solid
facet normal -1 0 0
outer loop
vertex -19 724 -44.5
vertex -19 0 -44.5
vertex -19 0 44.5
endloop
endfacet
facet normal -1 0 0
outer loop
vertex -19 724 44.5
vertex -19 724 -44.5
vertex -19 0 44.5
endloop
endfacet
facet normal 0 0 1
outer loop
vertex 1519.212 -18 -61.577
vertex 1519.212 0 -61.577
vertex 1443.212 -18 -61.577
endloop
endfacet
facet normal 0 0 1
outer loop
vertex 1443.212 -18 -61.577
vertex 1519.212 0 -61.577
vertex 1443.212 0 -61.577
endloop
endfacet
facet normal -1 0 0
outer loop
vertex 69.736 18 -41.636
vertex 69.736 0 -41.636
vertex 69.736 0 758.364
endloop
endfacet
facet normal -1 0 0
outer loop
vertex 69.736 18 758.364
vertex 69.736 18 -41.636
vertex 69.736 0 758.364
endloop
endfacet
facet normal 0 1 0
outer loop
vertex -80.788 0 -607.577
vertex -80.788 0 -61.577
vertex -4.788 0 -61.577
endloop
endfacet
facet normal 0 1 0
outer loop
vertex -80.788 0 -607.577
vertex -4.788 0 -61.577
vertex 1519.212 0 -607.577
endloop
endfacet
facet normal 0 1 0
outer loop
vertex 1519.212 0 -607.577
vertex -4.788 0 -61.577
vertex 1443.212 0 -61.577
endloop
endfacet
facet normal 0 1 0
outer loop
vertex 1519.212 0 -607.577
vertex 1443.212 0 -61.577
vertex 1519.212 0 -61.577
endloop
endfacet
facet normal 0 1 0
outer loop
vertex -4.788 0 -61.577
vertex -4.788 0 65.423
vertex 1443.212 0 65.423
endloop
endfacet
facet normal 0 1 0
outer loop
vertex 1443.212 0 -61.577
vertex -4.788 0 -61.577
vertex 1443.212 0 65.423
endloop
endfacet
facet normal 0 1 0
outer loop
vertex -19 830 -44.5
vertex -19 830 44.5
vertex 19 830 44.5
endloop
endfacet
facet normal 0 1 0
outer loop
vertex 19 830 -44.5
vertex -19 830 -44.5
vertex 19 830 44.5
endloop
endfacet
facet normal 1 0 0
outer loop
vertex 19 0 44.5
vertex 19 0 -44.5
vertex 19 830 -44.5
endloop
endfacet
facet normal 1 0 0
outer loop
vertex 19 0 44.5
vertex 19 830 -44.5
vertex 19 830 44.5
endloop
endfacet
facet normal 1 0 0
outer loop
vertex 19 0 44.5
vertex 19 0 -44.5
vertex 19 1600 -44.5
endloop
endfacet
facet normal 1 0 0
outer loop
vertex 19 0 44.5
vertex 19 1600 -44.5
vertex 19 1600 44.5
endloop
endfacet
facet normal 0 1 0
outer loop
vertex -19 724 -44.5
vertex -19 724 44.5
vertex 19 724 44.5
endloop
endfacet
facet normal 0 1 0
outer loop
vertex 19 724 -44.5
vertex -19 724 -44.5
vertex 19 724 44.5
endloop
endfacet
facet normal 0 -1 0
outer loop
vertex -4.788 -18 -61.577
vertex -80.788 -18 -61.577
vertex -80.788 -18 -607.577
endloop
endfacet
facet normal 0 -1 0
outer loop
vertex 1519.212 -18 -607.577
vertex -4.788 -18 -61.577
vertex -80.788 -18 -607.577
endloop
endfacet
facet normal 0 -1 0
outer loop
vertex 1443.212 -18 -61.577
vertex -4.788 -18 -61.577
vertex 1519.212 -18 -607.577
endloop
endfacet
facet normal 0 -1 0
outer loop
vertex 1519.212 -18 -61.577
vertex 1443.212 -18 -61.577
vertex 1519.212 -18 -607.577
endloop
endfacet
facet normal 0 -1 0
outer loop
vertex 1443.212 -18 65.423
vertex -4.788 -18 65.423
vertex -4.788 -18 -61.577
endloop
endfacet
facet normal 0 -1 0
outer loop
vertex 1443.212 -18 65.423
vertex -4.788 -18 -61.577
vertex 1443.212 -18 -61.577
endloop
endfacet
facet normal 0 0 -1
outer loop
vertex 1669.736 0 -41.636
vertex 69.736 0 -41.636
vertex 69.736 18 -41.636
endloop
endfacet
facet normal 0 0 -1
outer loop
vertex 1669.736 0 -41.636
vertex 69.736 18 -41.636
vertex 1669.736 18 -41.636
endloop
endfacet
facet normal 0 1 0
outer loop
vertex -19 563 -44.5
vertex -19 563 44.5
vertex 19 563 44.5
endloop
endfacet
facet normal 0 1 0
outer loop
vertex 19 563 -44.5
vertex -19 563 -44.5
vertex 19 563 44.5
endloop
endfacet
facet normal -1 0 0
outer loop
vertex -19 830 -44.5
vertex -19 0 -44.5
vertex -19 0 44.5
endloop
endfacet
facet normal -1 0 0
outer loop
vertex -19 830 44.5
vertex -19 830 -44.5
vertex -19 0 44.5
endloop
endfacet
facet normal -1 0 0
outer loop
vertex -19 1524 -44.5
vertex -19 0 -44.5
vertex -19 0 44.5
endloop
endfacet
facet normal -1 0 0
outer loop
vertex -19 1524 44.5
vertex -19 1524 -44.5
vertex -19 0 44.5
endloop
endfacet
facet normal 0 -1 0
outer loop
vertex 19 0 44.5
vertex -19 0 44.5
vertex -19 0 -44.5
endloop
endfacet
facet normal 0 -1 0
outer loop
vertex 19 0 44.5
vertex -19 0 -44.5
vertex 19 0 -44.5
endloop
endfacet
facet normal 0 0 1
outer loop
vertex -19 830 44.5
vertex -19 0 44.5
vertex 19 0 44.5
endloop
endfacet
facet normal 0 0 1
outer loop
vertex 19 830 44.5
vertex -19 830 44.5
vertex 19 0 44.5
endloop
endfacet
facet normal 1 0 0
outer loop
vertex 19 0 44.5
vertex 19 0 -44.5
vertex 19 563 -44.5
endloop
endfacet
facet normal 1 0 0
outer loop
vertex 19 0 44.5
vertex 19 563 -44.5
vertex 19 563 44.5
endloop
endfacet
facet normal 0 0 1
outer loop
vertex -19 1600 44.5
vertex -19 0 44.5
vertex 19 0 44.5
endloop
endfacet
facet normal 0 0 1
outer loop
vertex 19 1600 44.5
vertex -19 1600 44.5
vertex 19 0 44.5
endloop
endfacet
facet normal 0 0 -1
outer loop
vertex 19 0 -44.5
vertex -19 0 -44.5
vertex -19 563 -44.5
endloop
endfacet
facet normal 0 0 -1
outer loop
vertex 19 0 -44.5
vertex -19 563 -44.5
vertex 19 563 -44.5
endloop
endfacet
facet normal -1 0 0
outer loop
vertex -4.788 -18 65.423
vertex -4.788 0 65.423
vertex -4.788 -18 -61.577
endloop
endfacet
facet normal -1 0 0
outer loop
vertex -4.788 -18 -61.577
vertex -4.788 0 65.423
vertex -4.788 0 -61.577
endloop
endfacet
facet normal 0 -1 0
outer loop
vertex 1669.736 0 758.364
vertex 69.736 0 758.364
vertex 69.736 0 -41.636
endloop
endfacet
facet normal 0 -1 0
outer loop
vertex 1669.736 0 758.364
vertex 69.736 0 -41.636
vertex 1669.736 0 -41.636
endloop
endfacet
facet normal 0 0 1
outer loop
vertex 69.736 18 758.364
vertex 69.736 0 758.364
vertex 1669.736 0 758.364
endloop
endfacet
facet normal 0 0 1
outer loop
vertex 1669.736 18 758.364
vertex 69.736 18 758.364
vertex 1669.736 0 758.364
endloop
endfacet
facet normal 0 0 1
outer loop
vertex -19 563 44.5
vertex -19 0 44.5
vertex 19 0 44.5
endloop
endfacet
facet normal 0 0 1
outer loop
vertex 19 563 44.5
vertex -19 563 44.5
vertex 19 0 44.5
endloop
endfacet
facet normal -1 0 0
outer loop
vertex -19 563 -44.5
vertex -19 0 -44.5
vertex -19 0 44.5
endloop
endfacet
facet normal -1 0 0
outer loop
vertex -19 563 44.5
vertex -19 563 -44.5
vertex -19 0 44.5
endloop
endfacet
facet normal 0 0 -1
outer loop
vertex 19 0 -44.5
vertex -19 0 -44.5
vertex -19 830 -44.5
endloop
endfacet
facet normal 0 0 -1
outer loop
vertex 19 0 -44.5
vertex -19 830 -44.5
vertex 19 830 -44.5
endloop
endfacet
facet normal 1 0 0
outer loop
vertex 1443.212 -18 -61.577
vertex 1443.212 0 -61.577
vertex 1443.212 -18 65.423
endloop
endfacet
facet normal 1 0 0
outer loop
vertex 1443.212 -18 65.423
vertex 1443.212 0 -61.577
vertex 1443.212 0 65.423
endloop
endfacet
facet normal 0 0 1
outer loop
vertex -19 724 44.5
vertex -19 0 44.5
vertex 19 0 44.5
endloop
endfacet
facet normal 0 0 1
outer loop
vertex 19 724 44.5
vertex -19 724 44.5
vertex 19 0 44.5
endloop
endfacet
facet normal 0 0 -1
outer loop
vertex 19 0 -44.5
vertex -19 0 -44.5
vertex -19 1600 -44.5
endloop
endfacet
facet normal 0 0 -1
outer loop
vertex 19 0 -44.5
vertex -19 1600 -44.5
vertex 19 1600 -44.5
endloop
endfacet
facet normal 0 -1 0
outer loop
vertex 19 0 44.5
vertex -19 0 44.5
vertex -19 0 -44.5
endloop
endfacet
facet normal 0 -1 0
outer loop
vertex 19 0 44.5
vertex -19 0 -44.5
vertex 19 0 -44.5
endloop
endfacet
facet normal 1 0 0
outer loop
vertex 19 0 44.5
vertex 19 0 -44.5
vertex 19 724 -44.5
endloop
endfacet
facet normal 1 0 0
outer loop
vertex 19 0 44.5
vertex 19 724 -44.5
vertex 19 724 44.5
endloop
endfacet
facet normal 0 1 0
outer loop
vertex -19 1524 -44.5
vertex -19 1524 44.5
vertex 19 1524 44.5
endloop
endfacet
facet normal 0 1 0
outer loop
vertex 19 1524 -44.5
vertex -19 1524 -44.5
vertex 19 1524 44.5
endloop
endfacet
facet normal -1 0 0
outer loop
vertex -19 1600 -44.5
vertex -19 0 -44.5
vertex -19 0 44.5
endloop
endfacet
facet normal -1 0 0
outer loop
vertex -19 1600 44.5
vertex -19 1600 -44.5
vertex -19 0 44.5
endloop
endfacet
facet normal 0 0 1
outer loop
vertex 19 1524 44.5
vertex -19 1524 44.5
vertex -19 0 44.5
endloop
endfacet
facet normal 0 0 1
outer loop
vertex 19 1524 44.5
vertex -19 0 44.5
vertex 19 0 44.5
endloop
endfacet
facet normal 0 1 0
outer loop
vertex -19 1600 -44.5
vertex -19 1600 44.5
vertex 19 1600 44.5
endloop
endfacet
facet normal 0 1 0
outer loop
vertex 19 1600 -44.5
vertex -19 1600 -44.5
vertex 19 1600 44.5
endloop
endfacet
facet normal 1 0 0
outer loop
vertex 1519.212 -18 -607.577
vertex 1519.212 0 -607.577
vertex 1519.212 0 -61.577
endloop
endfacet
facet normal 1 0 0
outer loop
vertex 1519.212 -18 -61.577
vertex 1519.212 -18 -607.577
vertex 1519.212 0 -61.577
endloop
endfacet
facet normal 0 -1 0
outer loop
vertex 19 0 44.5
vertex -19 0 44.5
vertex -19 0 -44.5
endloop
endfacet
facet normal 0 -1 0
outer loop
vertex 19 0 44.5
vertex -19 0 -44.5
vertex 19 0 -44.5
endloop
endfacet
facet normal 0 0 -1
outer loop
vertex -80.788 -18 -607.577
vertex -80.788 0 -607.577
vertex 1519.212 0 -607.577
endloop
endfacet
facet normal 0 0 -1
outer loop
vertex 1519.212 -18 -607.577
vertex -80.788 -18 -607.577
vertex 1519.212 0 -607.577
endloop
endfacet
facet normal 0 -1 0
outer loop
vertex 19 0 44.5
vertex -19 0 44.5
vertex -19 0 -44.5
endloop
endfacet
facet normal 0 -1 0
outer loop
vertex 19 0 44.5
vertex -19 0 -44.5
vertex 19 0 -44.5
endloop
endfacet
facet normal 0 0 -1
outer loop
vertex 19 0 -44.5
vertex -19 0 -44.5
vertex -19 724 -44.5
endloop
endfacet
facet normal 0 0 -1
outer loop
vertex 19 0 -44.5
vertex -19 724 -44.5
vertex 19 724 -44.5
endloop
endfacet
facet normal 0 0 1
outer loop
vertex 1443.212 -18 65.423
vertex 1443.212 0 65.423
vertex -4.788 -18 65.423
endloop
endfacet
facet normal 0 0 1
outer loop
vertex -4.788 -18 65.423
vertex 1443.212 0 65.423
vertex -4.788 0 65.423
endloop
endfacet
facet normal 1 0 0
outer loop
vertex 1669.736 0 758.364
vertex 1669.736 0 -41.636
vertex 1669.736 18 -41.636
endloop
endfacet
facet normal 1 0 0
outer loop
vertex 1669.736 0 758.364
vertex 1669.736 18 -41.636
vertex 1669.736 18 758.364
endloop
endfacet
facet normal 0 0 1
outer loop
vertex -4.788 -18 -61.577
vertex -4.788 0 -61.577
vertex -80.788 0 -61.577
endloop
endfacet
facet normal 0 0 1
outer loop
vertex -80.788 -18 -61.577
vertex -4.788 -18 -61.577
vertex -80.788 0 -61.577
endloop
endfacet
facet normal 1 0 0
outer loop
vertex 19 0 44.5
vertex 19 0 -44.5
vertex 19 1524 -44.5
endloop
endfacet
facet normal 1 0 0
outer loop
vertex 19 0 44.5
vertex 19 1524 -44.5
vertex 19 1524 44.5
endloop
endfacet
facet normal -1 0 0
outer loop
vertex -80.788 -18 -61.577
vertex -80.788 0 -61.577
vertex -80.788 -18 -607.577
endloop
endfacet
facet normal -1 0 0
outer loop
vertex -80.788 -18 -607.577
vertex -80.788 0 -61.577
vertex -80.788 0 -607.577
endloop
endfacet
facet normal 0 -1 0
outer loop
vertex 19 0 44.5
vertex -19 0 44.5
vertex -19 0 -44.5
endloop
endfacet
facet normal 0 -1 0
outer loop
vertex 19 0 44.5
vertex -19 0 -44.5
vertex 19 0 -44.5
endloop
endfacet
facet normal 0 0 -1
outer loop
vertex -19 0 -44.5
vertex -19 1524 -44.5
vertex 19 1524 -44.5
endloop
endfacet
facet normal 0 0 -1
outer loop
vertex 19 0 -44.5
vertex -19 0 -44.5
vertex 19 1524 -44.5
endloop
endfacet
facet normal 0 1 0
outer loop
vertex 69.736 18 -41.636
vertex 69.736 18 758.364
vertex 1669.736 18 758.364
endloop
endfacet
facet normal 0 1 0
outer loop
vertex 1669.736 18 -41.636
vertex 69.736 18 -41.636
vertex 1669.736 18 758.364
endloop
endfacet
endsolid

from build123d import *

# Parameters (mm, degrees)
F5_W      = 38
F5_H      = 89
F6_DEPTH  = 1600
F7_DEPTH  = 724
F8_DEPTH  = 830
F9_DEPTH  = 563
F10_W     = 1600
F10_H     = 800
F11_DEPTH = 18
F12_DEPTH = 1524
F14_DEPTH = 18


with BuildPart() as f6:
    # F5 (on Front) → F6 (new body)
    with BuildSketch(Plane.XZ):
        Rectangle(F5_W, F5_H)
    extrude(amount=-F6_DEPTH)


with BuildPart() as f7:
    # F5 (on Front) → F7 (new body)
    with BuildSketch(Plane.XZ):
        Rectangle(F5_W, F5_H)
    extrude(amount=-F7_DEPTH)


with BuildPart() as f8:
    # F5 (on Front) → F8 (new body)
    with BuildSketch(Plane.XZ):
        Rectangle(F5_W, F5_H)
    extrude(amount=-F8_DEPTH)


with BuildPart() as f9:
    # F5 (on Front) → F9 (new body)
    with BuildSketch(Plane.XZ):
        Rectangle(F5_W, F5_H)
    extrude(amount=-F9_DEPTH)


with BuildPart() as f11:
    # F10 (on Front) → F11 (new body)
    with BuildSketch(Plane.XZ):
        with Locations((869.7355747223, 358.3636045456)):
            Rectangle(F10_W, F10_H)
    extrude(amount=-F11_DEPTH)


with BuildPart() as f12:
    # F5 (on Front) → F12 (new body)
    with BuildSketch(Plane.XZ):
        Rectangle(F5_W, F5_H)
    extrude(amount=-F12_DEPTH)


with BuildPart() as f14:
    # F13 (on Front) → F14 (new body)
    with BuildSketch(Plane.XZ):
        Polygon((1443.2116563372, 65.4233279824), (-4.7883436628, 65.4233279824), (-4.7883436628, -61.5766720176), (-80.7883436628, -61.5766720176), (-80.7883436628, -607.5766720176), (1519.2116563372, -607.5766720176), (1519.2116563372, -61.5766720176), (1443.2116563372, -61.5766720176), align=None)
    extrude(amount=F14_DEPTH)


solid = Compound([f6.part, f7.part, f8.part, f9.part, f11.part, f12.part, f14.part])
